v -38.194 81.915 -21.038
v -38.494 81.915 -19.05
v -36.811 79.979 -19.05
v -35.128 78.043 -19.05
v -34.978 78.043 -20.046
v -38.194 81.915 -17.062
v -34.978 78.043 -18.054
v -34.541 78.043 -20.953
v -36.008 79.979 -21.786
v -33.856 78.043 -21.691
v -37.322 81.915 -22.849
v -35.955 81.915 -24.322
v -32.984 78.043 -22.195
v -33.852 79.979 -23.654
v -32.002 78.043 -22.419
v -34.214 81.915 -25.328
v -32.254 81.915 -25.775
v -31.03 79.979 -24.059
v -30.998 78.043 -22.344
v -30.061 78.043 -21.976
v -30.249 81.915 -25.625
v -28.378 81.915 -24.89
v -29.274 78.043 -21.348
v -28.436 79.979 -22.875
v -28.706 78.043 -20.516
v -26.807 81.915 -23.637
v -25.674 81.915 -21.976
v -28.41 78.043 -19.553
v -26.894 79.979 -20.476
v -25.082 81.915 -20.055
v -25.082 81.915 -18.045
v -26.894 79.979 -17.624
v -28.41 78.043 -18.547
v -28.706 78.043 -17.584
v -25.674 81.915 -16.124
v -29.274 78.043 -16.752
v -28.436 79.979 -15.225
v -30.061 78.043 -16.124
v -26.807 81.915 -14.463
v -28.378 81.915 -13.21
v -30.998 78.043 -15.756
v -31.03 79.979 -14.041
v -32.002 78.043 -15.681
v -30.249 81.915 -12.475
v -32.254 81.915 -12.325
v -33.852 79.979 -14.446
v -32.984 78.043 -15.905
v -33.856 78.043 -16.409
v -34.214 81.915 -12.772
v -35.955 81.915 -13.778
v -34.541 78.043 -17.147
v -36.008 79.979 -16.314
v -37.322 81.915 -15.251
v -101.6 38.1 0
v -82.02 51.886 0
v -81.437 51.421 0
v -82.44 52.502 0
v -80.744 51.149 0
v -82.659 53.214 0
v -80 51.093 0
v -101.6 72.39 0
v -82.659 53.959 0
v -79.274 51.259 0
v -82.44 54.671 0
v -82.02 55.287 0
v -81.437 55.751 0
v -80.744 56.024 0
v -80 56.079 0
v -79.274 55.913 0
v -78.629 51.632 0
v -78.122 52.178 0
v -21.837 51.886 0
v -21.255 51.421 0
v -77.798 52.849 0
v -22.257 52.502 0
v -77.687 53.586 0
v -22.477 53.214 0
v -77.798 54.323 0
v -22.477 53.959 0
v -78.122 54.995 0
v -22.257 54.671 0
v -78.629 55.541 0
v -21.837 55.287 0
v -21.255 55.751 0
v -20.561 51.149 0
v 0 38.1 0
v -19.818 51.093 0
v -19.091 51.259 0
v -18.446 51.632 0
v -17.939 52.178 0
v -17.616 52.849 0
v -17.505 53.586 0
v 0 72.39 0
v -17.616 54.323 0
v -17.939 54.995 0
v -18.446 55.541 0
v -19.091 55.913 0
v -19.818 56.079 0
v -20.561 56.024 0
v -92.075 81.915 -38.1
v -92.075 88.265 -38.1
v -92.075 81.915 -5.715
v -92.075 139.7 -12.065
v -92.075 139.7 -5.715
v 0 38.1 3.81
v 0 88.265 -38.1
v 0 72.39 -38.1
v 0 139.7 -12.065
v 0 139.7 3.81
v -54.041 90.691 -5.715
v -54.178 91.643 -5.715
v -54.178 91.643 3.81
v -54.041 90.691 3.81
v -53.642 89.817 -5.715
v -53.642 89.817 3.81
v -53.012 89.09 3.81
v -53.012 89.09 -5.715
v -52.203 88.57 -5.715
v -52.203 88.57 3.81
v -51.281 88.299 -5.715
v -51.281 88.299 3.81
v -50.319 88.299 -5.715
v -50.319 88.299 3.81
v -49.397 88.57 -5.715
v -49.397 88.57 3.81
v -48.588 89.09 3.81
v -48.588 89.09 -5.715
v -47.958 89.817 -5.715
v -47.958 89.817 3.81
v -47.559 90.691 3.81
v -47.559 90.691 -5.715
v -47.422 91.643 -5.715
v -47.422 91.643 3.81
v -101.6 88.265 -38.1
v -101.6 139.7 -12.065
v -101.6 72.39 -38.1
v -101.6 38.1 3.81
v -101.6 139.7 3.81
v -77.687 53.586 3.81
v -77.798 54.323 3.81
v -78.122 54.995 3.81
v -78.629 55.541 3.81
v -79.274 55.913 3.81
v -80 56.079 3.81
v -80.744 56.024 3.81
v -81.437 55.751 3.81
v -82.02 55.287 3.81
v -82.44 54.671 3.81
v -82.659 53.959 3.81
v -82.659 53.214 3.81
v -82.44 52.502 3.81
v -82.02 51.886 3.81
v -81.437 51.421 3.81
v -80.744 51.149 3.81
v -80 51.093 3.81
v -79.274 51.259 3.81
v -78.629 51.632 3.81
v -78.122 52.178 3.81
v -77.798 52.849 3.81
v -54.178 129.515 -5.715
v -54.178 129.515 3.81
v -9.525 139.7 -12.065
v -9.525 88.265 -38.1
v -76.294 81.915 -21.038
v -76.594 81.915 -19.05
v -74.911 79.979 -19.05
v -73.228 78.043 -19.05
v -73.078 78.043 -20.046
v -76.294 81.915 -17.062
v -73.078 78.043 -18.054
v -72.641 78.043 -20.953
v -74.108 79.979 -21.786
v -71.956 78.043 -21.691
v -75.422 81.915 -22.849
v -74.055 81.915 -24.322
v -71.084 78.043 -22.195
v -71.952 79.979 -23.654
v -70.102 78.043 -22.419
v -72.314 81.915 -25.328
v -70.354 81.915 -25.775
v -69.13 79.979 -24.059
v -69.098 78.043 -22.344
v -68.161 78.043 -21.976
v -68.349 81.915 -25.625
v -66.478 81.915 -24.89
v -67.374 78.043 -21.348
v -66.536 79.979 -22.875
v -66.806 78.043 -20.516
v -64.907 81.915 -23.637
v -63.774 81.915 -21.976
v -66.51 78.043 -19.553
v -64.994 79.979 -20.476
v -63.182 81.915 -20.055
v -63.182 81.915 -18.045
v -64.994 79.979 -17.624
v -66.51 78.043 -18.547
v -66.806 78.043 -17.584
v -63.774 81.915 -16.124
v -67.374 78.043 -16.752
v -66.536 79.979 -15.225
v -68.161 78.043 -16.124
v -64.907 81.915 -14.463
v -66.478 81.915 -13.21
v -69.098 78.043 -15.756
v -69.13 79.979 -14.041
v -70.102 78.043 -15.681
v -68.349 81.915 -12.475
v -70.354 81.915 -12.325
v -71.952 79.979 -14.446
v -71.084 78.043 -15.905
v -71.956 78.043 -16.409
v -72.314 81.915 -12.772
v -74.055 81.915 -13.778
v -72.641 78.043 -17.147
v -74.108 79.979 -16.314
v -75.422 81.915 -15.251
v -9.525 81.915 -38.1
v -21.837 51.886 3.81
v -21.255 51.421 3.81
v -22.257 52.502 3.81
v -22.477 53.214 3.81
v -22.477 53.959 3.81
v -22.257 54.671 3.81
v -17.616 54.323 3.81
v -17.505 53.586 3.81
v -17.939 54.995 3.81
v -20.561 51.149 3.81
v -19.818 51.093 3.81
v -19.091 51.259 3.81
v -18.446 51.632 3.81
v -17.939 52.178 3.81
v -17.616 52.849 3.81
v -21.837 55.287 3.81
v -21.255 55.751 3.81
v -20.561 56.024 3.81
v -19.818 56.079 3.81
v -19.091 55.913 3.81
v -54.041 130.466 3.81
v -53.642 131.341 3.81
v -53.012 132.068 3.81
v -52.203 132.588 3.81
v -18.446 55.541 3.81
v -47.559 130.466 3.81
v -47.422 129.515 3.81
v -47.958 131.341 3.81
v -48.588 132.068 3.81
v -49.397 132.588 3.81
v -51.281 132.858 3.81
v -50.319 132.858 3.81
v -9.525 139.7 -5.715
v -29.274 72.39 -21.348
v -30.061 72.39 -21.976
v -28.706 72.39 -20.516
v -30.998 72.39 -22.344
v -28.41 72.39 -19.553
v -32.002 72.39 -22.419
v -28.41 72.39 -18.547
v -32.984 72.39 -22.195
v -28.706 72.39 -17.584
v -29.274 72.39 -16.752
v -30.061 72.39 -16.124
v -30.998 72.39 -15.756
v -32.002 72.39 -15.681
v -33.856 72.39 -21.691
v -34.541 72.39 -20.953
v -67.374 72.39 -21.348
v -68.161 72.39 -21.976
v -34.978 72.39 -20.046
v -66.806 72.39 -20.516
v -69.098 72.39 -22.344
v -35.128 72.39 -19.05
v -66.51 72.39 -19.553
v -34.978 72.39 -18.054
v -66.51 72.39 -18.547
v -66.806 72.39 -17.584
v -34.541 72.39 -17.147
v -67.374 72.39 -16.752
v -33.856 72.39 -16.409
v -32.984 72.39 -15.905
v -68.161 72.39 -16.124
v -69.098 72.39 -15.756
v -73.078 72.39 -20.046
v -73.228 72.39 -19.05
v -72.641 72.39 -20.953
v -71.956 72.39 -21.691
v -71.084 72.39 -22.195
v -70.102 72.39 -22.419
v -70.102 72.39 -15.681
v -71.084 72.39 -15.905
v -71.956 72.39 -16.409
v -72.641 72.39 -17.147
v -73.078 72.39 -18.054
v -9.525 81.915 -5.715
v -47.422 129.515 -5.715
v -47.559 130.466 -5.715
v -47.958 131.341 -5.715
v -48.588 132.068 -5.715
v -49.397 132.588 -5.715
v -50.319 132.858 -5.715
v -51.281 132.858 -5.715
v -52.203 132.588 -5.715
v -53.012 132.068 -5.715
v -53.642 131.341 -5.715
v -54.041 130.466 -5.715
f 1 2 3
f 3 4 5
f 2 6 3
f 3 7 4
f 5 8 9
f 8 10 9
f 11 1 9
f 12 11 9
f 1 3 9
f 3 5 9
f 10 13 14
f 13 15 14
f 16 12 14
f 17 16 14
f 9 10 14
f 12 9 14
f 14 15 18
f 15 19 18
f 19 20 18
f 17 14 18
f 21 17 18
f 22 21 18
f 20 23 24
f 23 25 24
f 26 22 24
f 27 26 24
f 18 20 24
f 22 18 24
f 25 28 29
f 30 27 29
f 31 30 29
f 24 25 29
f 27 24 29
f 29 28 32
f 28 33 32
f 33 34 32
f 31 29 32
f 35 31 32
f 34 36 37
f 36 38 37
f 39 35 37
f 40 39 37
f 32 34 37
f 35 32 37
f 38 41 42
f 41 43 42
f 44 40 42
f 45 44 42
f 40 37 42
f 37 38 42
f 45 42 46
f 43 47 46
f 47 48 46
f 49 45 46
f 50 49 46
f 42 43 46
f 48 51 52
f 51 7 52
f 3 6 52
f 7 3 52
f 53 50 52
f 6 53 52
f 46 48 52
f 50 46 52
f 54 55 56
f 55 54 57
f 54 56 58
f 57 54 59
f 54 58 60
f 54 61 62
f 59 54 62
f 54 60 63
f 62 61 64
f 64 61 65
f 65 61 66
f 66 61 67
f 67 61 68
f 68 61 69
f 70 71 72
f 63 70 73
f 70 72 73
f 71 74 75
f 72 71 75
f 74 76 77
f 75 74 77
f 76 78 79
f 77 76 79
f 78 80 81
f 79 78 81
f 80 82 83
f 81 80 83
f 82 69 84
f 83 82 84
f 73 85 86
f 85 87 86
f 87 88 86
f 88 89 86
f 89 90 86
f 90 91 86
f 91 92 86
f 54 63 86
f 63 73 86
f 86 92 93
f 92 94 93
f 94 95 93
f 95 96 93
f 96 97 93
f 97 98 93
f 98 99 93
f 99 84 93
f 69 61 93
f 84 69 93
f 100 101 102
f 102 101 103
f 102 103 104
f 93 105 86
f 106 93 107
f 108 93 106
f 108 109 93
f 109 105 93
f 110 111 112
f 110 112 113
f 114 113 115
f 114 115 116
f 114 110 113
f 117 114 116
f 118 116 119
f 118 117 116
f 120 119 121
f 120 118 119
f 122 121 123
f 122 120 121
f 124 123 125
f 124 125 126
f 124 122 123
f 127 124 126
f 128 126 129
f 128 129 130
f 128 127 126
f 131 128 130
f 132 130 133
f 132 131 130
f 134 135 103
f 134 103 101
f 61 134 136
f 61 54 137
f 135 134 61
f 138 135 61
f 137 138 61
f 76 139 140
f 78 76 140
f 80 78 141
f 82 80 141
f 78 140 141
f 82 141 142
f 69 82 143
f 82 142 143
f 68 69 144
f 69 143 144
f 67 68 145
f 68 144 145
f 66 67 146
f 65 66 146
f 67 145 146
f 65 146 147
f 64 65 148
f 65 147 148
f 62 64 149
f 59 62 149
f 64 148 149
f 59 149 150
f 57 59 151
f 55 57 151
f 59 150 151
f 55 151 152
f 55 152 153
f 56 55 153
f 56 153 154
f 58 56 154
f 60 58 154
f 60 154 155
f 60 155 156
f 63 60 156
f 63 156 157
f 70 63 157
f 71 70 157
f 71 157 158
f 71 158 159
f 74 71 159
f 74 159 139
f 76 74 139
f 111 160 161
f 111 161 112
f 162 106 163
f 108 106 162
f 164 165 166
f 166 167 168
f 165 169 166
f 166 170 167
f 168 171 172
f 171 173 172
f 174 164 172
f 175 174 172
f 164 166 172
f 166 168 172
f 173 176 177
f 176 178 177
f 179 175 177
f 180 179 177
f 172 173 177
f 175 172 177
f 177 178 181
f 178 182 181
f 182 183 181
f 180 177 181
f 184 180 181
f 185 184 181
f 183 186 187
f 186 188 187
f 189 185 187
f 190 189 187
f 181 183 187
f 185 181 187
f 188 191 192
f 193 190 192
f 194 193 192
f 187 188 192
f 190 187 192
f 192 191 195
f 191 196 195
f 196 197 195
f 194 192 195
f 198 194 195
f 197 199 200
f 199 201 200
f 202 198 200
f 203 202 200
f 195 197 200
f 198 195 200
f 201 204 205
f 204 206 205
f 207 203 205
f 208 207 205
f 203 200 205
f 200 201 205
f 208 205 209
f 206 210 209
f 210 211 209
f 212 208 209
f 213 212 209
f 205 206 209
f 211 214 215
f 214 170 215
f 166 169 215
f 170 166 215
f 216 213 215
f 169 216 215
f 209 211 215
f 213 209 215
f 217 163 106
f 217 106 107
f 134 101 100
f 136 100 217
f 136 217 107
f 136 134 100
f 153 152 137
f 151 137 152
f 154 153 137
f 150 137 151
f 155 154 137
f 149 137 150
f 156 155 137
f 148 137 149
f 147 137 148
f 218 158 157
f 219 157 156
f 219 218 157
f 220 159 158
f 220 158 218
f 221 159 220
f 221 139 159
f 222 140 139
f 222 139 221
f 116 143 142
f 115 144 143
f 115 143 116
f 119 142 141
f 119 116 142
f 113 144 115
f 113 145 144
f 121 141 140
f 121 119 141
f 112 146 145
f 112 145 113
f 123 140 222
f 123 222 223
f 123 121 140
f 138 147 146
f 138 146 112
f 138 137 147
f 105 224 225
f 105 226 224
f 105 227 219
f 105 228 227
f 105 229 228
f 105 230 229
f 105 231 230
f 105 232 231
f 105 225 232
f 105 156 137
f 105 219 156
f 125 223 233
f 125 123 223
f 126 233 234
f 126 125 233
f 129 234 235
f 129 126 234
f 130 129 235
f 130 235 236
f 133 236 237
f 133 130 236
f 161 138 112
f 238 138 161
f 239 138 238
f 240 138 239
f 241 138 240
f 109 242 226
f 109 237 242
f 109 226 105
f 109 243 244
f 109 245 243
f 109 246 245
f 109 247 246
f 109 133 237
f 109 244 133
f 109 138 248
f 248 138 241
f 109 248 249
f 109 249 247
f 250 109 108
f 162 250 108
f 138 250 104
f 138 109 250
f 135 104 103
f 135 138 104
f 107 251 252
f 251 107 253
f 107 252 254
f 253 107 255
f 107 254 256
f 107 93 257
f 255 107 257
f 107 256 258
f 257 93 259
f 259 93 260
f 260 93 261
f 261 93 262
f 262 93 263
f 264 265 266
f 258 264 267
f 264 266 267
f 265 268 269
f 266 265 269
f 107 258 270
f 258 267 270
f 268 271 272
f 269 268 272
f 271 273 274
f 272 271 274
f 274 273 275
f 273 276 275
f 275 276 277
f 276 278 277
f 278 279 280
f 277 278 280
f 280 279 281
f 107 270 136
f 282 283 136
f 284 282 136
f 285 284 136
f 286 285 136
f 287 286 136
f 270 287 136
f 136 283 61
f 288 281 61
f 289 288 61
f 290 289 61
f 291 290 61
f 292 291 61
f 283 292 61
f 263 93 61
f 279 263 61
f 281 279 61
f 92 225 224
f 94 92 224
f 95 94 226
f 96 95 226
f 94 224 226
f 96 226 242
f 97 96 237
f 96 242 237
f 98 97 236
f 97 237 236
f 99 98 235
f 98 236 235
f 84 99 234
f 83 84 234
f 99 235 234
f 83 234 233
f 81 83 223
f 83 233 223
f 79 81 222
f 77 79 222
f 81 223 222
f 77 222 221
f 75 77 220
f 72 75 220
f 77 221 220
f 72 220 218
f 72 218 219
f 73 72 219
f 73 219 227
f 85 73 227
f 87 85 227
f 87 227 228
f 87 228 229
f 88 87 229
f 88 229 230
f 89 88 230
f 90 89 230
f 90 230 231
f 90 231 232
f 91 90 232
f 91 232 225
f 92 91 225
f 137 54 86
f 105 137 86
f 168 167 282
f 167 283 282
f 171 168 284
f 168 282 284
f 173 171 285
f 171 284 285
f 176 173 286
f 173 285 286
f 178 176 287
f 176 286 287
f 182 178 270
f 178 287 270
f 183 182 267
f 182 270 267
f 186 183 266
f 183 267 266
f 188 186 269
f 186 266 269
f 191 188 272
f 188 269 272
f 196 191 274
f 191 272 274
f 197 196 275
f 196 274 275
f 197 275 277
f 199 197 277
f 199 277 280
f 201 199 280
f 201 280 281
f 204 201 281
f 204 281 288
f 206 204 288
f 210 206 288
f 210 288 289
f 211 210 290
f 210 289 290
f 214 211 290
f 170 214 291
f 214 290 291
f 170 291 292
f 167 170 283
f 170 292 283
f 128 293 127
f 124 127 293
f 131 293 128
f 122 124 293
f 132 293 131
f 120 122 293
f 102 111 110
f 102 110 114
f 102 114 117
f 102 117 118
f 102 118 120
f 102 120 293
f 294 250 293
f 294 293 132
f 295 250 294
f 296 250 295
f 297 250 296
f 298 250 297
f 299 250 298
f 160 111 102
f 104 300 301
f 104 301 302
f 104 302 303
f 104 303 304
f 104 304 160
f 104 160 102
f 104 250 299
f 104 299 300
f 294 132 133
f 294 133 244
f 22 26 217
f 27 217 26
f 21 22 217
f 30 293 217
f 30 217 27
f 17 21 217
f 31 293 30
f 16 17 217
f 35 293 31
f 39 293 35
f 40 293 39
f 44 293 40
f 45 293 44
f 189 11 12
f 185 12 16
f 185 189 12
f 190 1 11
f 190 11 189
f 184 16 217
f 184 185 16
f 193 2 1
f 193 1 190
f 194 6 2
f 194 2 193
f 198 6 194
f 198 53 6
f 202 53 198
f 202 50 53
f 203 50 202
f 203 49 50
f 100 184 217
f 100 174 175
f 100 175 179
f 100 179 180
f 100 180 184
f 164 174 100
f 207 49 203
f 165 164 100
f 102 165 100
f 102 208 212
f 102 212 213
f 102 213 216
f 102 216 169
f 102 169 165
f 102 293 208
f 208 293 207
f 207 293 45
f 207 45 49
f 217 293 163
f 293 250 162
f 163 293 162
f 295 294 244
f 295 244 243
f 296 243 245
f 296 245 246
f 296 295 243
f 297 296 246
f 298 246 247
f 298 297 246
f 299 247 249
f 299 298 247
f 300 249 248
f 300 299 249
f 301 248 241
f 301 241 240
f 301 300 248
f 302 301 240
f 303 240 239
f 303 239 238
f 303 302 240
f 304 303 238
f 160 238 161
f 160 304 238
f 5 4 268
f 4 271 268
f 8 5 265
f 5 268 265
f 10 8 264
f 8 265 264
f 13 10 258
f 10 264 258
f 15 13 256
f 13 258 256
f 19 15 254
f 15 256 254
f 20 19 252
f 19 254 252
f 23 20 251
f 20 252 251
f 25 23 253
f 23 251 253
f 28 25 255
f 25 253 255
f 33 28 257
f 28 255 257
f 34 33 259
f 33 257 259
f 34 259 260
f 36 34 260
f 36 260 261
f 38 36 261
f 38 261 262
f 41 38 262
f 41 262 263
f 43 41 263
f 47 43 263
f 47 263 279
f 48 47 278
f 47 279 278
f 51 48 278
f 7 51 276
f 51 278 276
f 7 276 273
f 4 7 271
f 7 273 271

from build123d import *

# Parameters (mm, degrees)
SKETCH1_W                                           = 101.6
SKETCH1_H                                           = 101.6
BOSS_EXTRUDE1_DEPTH                                 = 3.81
M6X1_0_TAPPED_HOLE1_D                               = 5
M6X1_0_TAPPED_HOLE1_DEPTH                           = 14.986
M6X1_0_TAPPED_HOLE1_TIP                             = 1.502151548
SKETCH4_W                                           = 101.6
SKETCH4_H                                           = 67.31
BOSS_EXTRUDE2_DEPTH                                 = 5.715
SKETCH7_W                                           = 101.6
SKETCH7_H                                           = 9.525
BOSS_EXTRUDE3_DEPTH                                 = 32.385
DZ_START                                            = -5.715
DZ_SLOT_DEPTH                                       = 9.525
RIB_1_BOSS_EXTRUDE4_DEPTH                           = 9.525
RIB_2_BOSS_EXTRUDE5_DEPTH                           = 9.525
CSK_FOR_1_4_FLAT_HEAD_SOCKET_CAP_SCREW1_D           = 6.7564
CSK_FOR_1_4_FLAT_HEAD_SOCKET_CAP_SCREW1_CSINK_D     = 13.4874
CSK_FOR_1_4_FLAT_HEAD_SOCKET_CAP_SCREW1_CSINK_ANGLE = 82


# Read off the part's stored shape, not the designer's step: dz slot
with BuildPart() as part:
    # Sketch1 → Boss-Extrude1 (new body)
    with BuildSketch(Plane.XY):
        with Locations((-50.8, 88.9)):
            Rectangle(SKETCH1_W, SKETCH1_H)
    extrude(amount=BOSS_EXTRUDE1_DEPTH)

    # M6x1.0 Tapped Hole1
    with Locations(Plane(origin=(-50.8, 0, 0), x_dir=(-1, 0, 0), z_dir=(0, 0, -1))):
        with Locations((-30.795161674, 53.586240129), (29.387245779, 53.586240129)):
            Hole(M6X1_0_TAPPED_HOLE1_D / 2, depth=M6X1_0_TAPPED_HOLE1_DEPTH)
            with Locations((0, 0, -(M6X1_0_TAPPED_HOLE1_DEPTH + M6X1_0_TAPPED_HOLE1_TIP / 2))):  # 118° drill point
                Cone(0, M6X1_0_TAPPED_HOLE1_D / 2, M6X1_0_TAPPED_HOLE1_TIP, mode=Mode.SUBTRACT)

    # Sketch4 → Boss-Extrude2 (add)
    with BuildSketch(Plane(origin=(0, 0, 0), x_dir=(-1, 0, 0), z_dir=(0, 0, -1))):
        with Locations((50.8, 106.045)):
            Rectangle(SKETCH4_W, SKETCH4_H)
    extrude(amount=BOSS_EXTRUDE2_DEPTH)

    # Sketch7 → Boss-Extrude3 (add)
    with BuildSketch(Plane(origin=(0, 0, -5.715), x_dir=(-1, 0, 0), z_dir=(0, 0, -1))):
        with Locations((50.8, 77.1525)):
            Rectangle(SKETCH7_W, SKETCH7_H)
    extrude(amount=BOSS_EXTRUDE3_DEPTH)

    # dz slot outline → dz slot (cut)
    with BuildSketch(Plane.XY.offset(DZ_START)):
        with BuildLine():
            ThreePointArc((-47.4218, 129.5146), (-50.8, 132.8928), (-54.1782, 129.5146))
            Line((-54.1782, 129.5146), (-54.1782, 91.6432))
            ThreePointArc((-54.1782, 91.6432), (-50.8, 88.265), (-47.4218, 91.6432))
            Line((-47.4218, 91.6432), (-47.4218, 129.5146))
        make_face()
    extrude(amount=DZ_SLOT_DEPTH, mode=Mode.SUBTRACT)

    # rib 1 Sketch9 → rib 1 Boss-Extrude4 (add)
    with BuildSketch(Plane(origin=(0, 0, 0), x_dir=(0, 0, -1), z_dir=(1, 0, 0))):
        Polygon((38.1, 81.915), (38.1, 88.265), (12.065, 139.7), (5.715, 139.7), (5.715, 81.915), align=None)
    extrude(amount=-RIB_1_BOSS_EXTRUDE4_DEPTH)

    # Sketch10 → rib 2 Boss-Extrude5 (add)
    with BuildSketch(Plane.ZY.offset(101.6)):
        Polygon((-38.1, 81.915), (-5.715, 81.915), (-5.715, 139.7), (-12.065, 139.7), (-38.1, 88.265), align=None)
    extrude(amount=-RIB_2_BOSS_EXTRUDE5_DEPTH)

    # CSK for 1/4 Flat Head Socket Cap Screw1 (through all)
    with Locations(Plane(origin=(-50.8, 81.915, -38.1), x_dir=(1, 0, 0), z_dir=(0, 1, 0))):
        with Locations((19.05, -19.05), (-19.05, -19.05)):
            CounterSinkHole(CSK_FOR_1_4_FLAT_HEAD_SOCKET_CAP_SCREW1_D / 2, CSK_FOR_1_4_FLAT_HEAD_SOCKET_CAP_SCREW1_CSINK_D / 2, counter_sink_angle=CSK_FOR_1_4_FLAT_HEAD_SOCKET_CAP_SCREW1_CSINK_ANGLE)


solid = part.part
